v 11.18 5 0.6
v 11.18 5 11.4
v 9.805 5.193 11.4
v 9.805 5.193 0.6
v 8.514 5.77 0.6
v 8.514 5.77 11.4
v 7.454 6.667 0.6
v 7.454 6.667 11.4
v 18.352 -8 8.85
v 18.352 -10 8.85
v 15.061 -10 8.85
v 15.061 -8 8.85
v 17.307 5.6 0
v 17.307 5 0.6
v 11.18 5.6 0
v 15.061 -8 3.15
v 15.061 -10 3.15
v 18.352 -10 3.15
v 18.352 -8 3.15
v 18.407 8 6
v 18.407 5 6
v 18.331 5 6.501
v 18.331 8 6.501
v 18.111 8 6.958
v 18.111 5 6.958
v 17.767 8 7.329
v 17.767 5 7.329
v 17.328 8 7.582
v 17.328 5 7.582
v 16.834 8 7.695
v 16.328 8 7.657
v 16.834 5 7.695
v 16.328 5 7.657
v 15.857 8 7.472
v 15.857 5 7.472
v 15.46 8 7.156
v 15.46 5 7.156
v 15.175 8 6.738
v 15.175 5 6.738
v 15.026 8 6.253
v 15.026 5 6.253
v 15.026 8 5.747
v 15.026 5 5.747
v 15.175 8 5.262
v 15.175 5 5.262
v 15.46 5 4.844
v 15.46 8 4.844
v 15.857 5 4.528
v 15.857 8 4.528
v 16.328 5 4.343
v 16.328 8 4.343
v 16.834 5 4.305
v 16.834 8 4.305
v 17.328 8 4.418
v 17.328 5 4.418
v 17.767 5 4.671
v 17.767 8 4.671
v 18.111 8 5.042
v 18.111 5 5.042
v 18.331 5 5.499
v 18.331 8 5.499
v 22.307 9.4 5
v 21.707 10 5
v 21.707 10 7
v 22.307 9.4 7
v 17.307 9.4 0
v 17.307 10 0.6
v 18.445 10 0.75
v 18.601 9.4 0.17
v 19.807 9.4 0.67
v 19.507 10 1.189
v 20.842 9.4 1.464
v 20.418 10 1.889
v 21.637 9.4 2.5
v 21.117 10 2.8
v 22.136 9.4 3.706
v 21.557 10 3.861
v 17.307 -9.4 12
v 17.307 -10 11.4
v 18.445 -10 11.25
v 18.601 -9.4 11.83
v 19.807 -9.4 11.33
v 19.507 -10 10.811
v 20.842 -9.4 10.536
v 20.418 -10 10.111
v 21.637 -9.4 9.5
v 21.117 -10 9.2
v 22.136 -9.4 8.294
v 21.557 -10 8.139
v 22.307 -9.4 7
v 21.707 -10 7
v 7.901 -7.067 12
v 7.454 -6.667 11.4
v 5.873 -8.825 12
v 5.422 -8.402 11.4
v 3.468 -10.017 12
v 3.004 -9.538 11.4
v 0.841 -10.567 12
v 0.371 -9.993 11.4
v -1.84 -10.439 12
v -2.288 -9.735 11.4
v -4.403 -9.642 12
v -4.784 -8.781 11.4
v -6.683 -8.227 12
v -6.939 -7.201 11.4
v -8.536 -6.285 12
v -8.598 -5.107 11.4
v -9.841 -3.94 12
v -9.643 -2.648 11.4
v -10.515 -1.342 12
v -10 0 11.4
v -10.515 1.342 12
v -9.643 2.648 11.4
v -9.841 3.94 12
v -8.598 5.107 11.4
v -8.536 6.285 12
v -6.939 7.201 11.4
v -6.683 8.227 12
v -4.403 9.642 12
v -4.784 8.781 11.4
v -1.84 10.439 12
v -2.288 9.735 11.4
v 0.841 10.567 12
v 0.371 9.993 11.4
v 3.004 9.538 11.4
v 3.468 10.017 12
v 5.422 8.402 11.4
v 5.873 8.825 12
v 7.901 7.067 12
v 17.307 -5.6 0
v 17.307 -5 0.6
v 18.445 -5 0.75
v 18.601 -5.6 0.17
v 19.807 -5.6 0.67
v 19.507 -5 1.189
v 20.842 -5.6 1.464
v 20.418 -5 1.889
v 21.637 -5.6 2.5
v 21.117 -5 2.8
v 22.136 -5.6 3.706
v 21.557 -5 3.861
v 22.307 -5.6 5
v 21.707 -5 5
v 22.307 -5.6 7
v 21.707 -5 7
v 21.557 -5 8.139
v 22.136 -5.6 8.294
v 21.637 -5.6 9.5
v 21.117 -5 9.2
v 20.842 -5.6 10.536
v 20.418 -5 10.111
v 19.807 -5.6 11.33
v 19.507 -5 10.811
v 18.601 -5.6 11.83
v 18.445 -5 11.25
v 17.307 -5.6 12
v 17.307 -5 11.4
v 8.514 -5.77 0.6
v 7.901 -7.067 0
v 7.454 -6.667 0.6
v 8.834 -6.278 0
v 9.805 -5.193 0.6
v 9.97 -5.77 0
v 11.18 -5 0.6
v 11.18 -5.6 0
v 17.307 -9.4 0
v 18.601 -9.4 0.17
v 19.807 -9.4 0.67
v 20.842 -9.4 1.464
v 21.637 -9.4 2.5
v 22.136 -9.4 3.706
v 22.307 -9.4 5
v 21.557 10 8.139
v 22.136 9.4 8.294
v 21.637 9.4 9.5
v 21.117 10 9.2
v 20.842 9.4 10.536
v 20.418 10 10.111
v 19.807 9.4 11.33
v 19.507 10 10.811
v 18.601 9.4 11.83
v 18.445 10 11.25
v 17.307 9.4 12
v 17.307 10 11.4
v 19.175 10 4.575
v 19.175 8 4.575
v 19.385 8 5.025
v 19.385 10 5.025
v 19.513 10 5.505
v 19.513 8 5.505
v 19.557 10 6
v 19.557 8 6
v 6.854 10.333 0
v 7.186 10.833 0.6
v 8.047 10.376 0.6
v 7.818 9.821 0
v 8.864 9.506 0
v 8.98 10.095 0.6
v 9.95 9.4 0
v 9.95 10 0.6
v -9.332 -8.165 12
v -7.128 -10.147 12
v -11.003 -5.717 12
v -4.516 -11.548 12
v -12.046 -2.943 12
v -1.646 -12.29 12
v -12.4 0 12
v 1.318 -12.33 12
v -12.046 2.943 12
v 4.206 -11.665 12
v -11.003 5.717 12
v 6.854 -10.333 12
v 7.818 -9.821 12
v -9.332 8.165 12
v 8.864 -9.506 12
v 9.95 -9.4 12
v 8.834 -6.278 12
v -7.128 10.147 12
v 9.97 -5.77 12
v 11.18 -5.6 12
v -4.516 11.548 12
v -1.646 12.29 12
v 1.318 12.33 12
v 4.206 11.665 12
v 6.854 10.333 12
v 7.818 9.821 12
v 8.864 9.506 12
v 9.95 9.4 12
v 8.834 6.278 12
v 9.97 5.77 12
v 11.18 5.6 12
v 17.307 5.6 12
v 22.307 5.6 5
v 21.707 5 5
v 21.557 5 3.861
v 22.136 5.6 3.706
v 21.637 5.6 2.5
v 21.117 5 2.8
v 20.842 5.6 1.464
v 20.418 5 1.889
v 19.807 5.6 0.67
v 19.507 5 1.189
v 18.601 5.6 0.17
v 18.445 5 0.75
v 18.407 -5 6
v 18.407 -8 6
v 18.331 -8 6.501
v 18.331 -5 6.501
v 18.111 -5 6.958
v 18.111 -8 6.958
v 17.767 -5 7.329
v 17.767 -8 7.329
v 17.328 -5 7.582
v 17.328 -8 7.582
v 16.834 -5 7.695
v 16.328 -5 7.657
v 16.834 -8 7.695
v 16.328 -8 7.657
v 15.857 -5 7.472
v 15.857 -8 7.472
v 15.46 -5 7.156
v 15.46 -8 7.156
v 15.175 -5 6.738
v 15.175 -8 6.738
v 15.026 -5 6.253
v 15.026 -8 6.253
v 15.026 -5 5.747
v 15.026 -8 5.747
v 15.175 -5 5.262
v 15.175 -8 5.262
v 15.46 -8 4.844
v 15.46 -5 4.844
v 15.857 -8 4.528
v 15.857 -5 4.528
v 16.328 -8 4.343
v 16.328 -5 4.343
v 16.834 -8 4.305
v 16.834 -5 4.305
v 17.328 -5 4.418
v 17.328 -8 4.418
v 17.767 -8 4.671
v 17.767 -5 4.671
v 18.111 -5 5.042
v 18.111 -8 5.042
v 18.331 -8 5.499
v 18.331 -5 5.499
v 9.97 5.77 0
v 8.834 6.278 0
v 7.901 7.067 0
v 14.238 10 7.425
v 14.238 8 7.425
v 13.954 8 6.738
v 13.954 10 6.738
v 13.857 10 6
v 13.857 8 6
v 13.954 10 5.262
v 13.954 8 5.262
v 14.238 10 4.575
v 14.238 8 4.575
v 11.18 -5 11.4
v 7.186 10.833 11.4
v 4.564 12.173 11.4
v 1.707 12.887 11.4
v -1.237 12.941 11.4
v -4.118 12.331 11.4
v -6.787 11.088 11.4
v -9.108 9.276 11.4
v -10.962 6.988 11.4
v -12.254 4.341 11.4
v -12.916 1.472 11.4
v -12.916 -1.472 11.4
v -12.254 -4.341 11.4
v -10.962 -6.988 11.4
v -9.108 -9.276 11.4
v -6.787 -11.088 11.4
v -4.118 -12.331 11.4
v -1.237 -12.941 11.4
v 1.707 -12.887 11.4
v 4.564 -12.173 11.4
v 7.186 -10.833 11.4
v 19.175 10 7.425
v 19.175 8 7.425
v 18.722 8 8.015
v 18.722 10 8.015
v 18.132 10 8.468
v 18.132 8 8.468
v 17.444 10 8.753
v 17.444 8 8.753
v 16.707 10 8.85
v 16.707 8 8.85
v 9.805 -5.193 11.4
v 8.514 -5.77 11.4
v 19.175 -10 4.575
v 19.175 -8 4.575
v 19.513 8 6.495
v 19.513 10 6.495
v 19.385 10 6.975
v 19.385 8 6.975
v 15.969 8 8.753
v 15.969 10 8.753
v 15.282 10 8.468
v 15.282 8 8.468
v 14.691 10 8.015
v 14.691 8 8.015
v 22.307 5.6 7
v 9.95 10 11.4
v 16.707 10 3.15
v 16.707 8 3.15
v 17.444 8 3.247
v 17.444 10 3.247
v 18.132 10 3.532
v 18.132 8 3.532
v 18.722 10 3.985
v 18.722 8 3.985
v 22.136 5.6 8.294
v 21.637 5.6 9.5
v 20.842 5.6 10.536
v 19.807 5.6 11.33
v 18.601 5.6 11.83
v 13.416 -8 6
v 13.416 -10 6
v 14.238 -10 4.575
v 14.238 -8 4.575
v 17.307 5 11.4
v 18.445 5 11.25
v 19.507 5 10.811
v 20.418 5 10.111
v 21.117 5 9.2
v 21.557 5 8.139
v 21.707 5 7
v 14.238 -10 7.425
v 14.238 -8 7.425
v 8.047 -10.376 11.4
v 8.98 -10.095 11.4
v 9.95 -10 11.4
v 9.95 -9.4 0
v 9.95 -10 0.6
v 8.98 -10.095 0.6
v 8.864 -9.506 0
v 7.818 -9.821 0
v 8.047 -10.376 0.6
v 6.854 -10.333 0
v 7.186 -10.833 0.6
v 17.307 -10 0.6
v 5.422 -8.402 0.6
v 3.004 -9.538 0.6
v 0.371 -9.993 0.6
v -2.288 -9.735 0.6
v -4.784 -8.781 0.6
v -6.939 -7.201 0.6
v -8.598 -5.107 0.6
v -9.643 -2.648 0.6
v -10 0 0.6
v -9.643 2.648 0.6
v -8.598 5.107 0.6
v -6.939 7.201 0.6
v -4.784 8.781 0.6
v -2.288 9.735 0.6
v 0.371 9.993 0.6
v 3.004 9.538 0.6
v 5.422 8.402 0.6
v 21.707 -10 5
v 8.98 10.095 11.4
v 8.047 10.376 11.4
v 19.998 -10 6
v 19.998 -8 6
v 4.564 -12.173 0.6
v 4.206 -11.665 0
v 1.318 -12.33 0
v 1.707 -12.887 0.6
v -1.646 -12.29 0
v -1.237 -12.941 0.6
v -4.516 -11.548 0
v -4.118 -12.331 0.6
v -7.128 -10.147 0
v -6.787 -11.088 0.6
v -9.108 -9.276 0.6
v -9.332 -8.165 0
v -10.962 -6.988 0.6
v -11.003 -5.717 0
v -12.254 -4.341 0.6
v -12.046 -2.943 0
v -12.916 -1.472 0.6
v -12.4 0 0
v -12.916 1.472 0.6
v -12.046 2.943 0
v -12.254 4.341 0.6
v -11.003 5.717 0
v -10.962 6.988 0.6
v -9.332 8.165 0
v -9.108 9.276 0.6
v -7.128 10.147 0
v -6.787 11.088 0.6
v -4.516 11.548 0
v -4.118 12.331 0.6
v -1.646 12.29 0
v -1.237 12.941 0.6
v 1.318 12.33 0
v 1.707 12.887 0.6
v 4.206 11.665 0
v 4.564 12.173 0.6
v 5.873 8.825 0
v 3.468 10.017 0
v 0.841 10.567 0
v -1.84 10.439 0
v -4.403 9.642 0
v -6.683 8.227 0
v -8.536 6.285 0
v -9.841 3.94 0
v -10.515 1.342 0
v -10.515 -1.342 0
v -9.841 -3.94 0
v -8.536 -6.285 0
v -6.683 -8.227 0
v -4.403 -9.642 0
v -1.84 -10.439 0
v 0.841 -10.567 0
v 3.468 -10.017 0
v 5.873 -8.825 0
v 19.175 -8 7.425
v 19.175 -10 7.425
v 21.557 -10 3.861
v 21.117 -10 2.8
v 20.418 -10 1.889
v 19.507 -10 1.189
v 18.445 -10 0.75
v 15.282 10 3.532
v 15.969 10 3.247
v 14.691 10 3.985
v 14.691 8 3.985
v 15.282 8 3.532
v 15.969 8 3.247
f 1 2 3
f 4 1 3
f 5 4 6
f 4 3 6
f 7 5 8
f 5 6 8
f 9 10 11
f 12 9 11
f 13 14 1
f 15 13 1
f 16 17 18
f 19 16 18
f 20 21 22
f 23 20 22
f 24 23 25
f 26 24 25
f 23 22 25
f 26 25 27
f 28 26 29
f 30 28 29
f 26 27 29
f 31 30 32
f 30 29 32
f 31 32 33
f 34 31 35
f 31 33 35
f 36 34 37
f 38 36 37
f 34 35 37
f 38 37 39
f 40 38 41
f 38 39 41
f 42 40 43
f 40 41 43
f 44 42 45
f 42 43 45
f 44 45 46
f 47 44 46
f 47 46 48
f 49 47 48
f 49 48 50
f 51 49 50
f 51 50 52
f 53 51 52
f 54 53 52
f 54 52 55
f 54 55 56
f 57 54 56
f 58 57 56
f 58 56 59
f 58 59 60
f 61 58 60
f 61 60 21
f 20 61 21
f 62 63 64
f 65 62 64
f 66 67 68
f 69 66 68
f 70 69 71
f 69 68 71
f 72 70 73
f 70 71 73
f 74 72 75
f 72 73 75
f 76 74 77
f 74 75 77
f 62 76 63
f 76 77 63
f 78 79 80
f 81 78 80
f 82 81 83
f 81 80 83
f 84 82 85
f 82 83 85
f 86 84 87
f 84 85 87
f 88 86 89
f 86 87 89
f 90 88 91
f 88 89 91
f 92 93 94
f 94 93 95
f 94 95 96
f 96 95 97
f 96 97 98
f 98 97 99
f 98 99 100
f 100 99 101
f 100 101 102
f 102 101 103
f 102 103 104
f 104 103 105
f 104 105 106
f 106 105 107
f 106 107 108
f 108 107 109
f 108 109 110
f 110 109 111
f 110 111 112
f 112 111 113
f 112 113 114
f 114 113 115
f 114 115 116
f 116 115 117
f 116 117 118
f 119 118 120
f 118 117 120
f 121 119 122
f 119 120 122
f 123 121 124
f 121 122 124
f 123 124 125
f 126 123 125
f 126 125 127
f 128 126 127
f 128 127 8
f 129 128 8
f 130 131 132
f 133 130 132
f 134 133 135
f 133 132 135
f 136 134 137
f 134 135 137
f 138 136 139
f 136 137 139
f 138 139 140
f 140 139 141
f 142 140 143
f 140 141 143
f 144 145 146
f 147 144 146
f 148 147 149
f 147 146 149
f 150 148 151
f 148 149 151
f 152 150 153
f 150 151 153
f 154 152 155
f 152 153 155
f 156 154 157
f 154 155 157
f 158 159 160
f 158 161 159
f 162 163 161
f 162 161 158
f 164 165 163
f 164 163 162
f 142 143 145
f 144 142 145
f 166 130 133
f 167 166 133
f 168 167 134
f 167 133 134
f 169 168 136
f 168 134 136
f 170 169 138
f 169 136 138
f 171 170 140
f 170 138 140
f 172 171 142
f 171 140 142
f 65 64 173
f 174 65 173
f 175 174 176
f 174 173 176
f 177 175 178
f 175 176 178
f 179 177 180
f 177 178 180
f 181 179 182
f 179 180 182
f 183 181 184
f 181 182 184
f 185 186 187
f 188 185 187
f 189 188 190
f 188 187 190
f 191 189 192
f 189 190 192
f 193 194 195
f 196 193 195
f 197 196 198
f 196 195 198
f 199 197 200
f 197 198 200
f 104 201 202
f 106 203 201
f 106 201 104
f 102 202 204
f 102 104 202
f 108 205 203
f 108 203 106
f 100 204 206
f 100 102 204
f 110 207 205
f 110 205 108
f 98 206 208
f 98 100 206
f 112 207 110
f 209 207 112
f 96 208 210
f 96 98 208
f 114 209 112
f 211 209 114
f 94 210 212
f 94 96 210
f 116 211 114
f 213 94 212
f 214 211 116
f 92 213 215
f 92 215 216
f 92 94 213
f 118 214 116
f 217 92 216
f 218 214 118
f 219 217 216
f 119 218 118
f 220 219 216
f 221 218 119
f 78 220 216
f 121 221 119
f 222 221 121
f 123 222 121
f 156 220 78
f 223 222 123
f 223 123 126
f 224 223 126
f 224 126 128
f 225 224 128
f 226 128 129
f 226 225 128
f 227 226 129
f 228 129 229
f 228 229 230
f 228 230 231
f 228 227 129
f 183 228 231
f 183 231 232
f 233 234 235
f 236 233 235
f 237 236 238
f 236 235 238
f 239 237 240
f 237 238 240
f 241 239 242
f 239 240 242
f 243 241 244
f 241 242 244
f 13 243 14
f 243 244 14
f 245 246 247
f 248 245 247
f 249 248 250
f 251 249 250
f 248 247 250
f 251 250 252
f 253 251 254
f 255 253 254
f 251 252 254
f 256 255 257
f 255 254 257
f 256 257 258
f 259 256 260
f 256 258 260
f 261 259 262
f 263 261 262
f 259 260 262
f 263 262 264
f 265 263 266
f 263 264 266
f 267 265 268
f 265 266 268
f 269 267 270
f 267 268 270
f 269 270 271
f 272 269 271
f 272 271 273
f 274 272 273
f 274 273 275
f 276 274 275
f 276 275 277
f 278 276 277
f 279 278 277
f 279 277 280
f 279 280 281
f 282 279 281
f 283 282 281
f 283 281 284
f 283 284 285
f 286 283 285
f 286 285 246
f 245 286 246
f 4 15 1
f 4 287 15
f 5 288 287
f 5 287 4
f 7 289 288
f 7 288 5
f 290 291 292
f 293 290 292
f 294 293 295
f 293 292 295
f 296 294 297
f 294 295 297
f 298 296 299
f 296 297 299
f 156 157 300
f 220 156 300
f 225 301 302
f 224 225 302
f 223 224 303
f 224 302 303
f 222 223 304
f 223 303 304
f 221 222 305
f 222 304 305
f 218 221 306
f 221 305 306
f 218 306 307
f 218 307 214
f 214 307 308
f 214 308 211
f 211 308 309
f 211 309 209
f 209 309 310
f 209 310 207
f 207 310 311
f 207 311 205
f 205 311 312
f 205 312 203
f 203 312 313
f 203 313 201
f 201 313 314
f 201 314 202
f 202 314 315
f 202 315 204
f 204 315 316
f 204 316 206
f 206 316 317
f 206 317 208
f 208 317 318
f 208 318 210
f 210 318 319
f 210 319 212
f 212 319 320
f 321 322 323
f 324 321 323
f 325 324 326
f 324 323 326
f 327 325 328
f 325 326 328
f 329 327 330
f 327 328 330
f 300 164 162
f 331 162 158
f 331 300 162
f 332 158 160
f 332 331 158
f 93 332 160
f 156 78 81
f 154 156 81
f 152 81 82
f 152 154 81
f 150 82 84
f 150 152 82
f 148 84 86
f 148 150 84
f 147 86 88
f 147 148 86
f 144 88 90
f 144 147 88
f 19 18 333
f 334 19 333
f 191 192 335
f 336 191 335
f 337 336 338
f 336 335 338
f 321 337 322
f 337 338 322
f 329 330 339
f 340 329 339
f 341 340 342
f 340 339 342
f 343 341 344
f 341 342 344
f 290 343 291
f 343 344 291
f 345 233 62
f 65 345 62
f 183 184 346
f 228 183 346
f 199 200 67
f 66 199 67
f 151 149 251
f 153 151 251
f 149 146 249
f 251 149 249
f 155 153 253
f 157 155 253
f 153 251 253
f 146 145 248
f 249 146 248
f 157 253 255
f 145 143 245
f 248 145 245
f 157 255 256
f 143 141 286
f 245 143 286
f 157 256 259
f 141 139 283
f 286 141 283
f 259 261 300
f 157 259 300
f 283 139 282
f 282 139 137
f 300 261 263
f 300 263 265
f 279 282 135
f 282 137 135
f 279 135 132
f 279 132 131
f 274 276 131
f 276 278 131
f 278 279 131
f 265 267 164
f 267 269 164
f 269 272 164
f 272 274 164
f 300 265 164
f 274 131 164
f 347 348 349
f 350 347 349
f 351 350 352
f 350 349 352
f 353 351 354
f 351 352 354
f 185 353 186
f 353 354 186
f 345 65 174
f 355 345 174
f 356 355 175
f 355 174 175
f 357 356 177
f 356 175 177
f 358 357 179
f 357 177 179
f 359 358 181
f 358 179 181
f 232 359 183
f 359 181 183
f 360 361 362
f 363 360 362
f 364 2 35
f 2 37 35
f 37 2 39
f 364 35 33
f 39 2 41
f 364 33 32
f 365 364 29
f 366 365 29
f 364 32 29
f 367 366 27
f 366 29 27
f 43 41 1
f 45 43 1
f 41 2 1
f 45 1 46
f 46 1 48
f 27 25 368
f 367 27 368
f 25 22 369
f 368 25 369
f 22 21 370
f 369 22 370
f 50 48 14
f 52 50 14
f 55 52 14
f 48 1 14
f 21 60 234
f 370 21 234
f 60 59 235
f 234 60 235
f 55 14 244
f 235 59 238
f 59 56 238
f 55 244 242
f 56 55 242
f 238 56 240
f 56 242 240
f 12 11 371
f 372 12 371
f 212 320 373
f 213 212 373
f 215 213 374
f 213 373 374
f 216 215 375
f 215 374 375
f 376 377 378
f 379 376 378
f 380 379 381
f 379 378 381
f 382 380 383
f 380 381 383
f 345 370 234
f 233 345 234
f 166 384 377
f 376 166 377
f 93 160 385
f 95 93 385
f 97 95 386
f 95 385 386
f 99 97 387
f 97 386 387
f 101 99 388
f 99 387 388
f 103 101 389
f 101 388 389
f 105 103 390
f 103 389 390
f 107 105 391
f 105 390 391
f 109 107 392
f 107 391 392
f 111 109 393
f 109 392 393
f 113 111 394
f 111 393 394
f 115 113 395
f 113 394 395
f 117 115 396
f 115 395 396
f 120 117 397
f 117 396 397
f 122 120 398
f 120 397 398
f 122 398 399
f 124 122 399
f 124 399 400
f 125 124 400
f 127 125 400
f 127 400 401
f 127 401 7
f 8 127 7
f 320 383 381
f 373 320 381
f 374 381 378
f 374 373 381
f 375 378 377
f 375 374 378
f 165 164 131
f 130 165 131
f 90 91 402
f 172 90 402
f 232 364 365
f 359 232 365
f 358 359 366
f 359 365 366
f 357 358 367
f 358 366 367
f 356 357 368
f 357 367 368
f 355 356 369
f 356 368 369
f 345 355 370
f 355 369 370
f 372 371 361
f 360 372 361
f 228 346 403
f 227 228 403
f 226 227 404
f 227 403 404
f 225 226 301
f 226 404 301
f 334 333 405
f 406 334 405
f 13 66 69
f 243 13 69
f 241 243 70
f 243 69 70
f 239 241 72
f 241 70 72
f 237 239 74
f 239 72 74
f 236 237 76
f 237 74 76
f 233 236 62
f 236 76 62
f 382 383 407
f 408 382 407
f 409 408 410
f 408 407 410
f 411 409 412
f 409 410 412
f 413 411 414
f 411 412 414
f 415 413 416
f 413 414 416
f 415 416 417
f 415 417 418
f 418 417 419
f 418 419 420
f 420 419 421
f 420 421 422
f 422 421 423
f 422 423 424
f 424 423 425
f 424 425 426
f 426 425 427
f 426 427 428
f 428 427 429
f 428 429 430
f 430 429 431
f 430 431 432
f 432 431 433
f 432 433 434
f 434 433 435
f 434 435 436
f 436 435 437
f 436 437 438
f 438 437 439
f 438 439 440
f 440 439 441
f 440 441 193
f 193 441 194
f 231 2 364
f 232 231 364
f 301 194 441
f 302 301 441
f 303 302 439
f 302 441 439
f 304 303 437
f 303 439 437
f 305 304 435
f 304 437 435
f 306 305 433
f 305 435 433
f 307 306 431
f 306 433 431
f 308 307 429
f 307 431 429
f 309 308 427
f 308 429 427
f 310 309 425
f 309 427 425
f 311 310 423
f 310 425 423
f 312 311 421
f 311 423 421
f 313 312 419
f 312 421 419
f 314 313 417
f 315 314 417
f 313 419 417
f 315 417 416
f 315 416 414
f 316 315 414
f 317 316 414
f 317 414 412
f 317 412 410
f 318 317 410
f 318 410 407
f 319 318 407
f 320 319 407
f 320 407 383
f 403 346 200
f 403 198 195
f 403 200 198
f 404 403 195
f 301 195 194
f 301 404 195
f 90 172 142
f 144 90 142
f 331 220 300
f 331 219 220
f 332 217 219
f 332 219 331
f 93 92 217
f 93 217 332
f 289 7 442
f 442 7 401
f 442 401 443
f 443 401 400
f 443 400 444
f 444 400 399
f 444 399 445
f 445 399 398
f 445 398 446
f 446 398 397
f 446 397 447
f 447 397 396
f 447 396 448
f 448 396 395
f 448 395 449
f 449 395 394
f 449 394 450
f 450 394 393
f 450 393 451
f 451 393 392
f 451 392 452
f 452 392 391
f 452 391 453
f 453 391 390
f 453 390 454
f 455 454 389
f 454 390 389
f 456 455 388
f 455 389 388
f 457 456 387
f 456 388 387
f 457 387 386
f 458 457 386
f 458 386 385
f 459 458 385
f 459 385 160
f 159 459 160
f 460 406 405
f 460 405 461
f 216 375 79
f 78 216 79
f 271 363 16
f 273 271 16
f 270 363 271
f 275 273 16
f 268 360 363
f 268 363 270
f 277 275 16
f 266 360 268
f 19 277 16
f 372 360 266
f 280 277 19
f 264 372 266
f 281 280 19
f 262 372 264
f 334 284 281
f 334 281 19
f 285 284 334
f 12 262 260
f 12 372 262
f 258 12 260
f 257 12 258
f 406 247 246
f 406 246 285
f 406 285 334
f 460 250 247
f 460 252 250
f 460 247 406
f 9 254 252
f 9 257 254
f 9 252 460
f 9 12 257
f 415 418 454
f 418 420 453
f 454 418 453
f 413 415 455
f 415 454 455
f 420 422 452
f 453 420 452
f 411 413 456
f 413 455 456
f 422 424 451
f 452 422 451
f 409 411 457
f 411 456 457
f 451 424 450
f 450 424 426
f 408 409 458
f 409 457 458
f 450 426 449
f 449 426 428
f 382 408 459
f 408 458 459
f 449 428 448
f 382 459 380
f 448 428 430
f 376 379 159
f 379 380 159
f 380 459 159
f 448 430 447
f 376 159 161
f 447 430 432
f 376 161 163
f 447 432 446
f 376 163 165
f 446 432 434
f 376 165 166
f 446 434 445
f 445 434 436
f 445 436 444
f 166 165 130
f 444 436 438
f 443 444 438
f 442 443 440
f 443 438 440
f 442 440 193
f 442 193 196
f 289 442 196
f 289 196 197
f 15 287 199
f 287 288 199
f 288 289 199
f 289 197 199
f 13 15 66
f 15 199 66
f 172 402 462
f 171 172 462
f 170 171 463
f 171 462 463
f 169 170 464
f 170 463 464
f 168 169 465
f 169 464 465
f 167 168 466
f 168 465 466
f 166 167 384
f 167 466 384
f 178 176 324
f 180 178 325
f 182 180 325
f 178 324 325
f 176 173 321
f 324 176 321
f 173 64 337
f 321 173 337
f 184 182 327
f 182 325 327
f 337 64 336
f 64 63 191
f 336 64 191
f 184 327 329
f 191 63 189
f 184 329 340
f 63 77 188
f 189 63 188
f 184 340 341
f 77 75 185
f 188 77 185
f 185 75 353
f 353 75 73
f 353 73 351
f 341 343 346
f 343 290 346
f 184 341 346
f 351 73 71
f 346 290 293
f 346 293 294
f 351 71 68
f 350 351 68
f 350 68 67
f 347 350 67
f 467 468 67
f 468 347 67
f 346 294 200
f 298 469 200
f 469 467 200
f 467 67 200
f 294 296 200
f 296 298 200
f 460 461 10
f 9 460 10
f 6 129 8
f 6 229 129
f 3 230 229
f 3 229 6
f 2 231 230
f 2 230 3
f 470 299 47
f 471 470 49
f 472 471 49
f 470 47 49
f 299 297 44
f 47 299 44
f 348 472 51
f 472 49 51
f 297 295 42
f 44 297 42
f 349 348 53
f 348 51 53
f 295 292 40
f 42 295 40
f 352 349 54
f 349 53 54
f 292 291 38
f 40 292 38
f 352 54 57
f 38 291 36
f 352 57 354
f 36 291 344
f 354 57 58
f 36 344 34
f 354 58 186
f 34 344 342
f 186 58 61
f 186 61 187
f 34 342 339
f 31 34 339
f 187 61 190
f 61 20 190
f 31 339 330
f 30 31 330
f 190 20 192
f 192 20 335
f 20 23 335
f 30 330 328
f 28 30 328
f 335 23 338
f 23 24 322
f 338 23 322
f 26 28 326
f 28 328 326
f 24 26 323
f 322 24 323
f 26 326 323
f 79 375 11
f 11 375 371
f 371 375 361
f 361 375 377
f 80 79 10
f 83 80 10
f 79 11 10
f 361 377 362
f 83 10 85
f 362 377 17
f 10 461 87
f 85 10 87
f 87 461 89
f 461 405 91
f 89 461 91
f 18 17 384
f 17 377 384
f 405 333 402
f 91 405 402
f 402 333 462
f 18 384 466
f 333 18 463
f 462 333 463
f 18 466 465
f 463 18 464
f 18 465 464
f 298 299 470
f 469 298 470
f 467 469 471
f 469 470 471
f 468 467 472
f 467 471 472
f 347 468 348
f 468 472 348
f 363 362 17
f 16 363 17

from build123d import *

# Parameters (mm, degrees)
F1_DEPTH = 12
F2_R     = 5
F3_R     = 5
F4_SIZE  = 0.6
F5_R     = 1.7
F6_DEPTH = 23.001
F7_DEPTH = 2
F8_START = -18
F8_DEPTH = 2


with BuildPart() as f1:
    # F0 (on Top) → F1 (new body)
    with BuildSketch(Plane.XY):
        with BuildLine():
            ThreePointArc((8.3066238629, 5.5677643628), (8.4881874106, 5.2868397443), (8.6602540378, 5))
            Line((8.6602540378, 5), (12, 5))
            ThreePointArc((12, 5), (10.4565645973, 7.7240052319), (8.3066238629, 10))
            Line((8.3066238629, 10), (8.3066238629, 5.5677643628))
        make_face()
        with BuildLine():
            ThreePointArc((8.3066238629, 10), (10.4565645973, 7.7240052319), (12, 5))
            Line((12, 5), (22.3066238629, 5))
            Line((22.3066238629, 5), (22.3066238629, 10))
            Line((22.3066238629, 10), (8.3066238629, 10))
        make_face()
        with BuildLine():
            Line((22.3066238629, -5), (12, -5))
            ThreePointArc((12, -5), (10.4565645973, -7.7240052319), (8.3066238629, -10))
            Line((8.3066238629, -10), (22.3066238629, -10))
            Line((22.3066238629, -10), (22.3066238629, -5))
        make_face()
        with BuildLine():
            ThreePointArc((8.3066238629, -5.5677643628), (-10, 0), (8.3066238629, 5.5677643628))
            Line((8.3066238629, 5.5677643628), (8.3066238629, 10))
            ThreePointArc((8.3066238629, 10), (-13, 0), (8.3066238629, -10))
            Line((8.3066238629, -10), (8.3066238629, -5.5677643628))
        make_face()
        with BuildLine():
            Line((12, -5), (8.6602540378, -5))
            ThreePointArc((8.6602540378, -5), (8.4881874106, -5.2868397443), (8.3066238629, -5.5677643628))
            Line((8.3066238629, -5.5677643628), (8.3066238629, -10))
            ThreePointArc((8.3066238629, -10), (10.4565645973, -7.7240052319), (12, -5))
        make_face()
    extrude(amount=F1_DEPTH)

    # F2
    f2_edges = [f1.edges().sort_by_distance(p)[0] for p in [
        (8.306624, -10, 6),
        (8.306624, 10, 6),
        (8.660254, -5, 6),
        (8.660254, 5, 6),
    ]]
    fillet(f2_edges, radius=F2_R)

    # F3
    f3_edges = [f1.edges().sort_by_distance(p)[0] for p in [
        (22.306624, -7.5, 12),
        (22.306624, 7.5, 12),
        (22.306624, -7.5, 0),
        (22.306624, 7.5, 0),
    ]]
    fillet(f3_edges, radius=F3_R)

    # F4
    f4_edges = [f1.edges().sort_by_distance(p)[0] for p in [
        (-10, 0, 12),
        (-13, 0, 12),
        (-13, 0, 0),
        (-10, 0, 0),
    ]]
    chamfer(f4_edges, length=F4_SIZE)

    # F5 (on face) → F6 (cut, through all)
    with BuildSketch(Plane.XZ.offset(10)):
        with Locations((16.7066238629, 6)):
            Circle(F5_R)
    extrude(amount=-F6_DEPTH, mode=Mode.SUBTRACT)

    # F5 (on face) → F7 (cut)
    with BuildSketch(Plane.XZ.offset(10)):
        with BuildLine():
            ThreePointArc((19.1747962235, 4.5749999304), (19.4595124574, 5.2623656827), (19.5566238629, 6))
            ThreePointArc((19.5566238629, 6), (19.4595124887, 6.7376342007), (19.1747963443, 7.4249998605))
            ThreePointArc((19.1747963443, 7.4249998605), (18.1316239327, 8.4681723605), (16.7066238629, 8.85))
            ThreePointArc((16.7066238629, 8.85), (15.2816238977, 8.4681724209), (14.2384515023, 7.4250000696))
            ThreePointArc((14.2384515023, 7.4250000696), (13.8566238629, 6.0000000373), (14.238451465, 4.574999995))
            ThreePointArc((14.238451465, 4.574999995), (15.2816238654, 3.5318275978), (16.7066238629, 3.15))
            ThreePointArc((16.7066238629, 3.15), (18.1316238281, 3.5318275791), (19.1747962235, 4.5749999304))
        make_face()
        with Locations((16.7066238629, 6)):
            Circle(F5_R, mode=Mode.SUBTRACT)
        with BuildLine():
            Line((15.0611755957, 3.15), (16.7066238629, 3.15))
            ThreePointArc((16.7066238629, 3.15), (15.2816238654, 3.5318275978), (14.238451465, 4.574999995))
            Line((14.238451465, 4.574999995), (15.0611755957, 3.15))
        make_face()
        with BuildLine():
            Line((18.3520721301, 3.15), (19.1747962235, 4.5749999304))
            ThreePointArc((19.1747962235, 4.5749999304), (18.1316238281, 3.5318275791), (16.7066238629, 3.15))
            Line((16.7066238629, 3.15), (18.3520721301, 3.15))
        make_face()
        with BuildLine():
            ThreePointArc((19.1747963443, 7.4249998605), (19.4595124887, 6.7376342007), (19.5566238629, 6))
            ThreePointArc((19.5566238629, 6), (19.4595124574, 5.2623656827), (19.1747962235, 4.5749999304))
            Line((19.1747962235, 4.5749999304), (19.9975203973, 6))
            Line((19.9975203973, 6), (19.1747963443, 7.4249998605))
        make_face()
        with BuildLine():
            ThreePointArc((16.7066238629, 8.85), (18.1316239327, 8.4681723605), (19.1747963443, 7.4249998605))
            Line((19.1747963443, 7.4249998605), (18.3520721301, 8.85))
            Line((18.3520721301, 8.85), (16.7066238629, 8.85))
        make_face()
        with BuildLine():
            ThreePointArc((14.238451465, 4.574999995), (13.8566238629, 6.0000000373), (14.2384515023, 7.4250000696))
            Line((14.2384515023, 7.4250000696), (13.4157273285, 6))
            Line((13.4157273285, 6), (14.238451465, 4.574999995))
        make_face()
        with BuildLine():
            ThreePointArc((14.2384515023, 7.4250000696), (15.2816238977, 8.4681724209), (16.7066238629, 8.85))
            Line((16.7066238629, 8.85), (15.0611755957, 8.85))
            Line((15.0611755957, 8.85), (14.2384515023, 7.4250000696))
        make_face()
    extrude(amount=-F7_DEPTH, mode=Mode.SUBTRACT)

    # F5 (on face) → F8 (cut)
    with BuildSketch(Plane.XZ.offset(10).offset(F8_START)):
        with BuildLine():
            ThreePointArc((19.1747962235, 4.5749999304), (19.4595124574, 5.2623656827), (19.5566238629, 6))
            ThreePointArc((19.5566238629, 6), (19.4595124887, 6.7376342007), (19.1747963443, 7.4249998605))
            ThreePointArc((19.1747963443, 7.4249998605), (18.1316239327, 8.4681723605), (16.7066238629, 8.85))
            ThreePointArc((16.7066238629, 8.85), (15.2816238977, 8.4681724209), (14.2384515023, 7.4250000696))
            ThreePointArc((14.2384515023, 7.4250000696), (13.8566238629, 6.0000000373), (14.238451465, 4.574999995))
            ThreePointArc((14.238451465, 4.574999995), (15.2816238654, 3.5318275978), (16.7066238629, 3.15))
            ThreePointArc((16.7066238629, 3.15), (18.1316238281, 3.5318275791), (19.1747962235, 4.5749999304))
        make_face()
        with Locations((16.7066238629, 6)):
            Circle(F5_R, mode=Mode.SUBTRACT)
    extrude(amount=-F8_DEPTH, mode=Mode.SUBTRACT)


solid = f1.part
